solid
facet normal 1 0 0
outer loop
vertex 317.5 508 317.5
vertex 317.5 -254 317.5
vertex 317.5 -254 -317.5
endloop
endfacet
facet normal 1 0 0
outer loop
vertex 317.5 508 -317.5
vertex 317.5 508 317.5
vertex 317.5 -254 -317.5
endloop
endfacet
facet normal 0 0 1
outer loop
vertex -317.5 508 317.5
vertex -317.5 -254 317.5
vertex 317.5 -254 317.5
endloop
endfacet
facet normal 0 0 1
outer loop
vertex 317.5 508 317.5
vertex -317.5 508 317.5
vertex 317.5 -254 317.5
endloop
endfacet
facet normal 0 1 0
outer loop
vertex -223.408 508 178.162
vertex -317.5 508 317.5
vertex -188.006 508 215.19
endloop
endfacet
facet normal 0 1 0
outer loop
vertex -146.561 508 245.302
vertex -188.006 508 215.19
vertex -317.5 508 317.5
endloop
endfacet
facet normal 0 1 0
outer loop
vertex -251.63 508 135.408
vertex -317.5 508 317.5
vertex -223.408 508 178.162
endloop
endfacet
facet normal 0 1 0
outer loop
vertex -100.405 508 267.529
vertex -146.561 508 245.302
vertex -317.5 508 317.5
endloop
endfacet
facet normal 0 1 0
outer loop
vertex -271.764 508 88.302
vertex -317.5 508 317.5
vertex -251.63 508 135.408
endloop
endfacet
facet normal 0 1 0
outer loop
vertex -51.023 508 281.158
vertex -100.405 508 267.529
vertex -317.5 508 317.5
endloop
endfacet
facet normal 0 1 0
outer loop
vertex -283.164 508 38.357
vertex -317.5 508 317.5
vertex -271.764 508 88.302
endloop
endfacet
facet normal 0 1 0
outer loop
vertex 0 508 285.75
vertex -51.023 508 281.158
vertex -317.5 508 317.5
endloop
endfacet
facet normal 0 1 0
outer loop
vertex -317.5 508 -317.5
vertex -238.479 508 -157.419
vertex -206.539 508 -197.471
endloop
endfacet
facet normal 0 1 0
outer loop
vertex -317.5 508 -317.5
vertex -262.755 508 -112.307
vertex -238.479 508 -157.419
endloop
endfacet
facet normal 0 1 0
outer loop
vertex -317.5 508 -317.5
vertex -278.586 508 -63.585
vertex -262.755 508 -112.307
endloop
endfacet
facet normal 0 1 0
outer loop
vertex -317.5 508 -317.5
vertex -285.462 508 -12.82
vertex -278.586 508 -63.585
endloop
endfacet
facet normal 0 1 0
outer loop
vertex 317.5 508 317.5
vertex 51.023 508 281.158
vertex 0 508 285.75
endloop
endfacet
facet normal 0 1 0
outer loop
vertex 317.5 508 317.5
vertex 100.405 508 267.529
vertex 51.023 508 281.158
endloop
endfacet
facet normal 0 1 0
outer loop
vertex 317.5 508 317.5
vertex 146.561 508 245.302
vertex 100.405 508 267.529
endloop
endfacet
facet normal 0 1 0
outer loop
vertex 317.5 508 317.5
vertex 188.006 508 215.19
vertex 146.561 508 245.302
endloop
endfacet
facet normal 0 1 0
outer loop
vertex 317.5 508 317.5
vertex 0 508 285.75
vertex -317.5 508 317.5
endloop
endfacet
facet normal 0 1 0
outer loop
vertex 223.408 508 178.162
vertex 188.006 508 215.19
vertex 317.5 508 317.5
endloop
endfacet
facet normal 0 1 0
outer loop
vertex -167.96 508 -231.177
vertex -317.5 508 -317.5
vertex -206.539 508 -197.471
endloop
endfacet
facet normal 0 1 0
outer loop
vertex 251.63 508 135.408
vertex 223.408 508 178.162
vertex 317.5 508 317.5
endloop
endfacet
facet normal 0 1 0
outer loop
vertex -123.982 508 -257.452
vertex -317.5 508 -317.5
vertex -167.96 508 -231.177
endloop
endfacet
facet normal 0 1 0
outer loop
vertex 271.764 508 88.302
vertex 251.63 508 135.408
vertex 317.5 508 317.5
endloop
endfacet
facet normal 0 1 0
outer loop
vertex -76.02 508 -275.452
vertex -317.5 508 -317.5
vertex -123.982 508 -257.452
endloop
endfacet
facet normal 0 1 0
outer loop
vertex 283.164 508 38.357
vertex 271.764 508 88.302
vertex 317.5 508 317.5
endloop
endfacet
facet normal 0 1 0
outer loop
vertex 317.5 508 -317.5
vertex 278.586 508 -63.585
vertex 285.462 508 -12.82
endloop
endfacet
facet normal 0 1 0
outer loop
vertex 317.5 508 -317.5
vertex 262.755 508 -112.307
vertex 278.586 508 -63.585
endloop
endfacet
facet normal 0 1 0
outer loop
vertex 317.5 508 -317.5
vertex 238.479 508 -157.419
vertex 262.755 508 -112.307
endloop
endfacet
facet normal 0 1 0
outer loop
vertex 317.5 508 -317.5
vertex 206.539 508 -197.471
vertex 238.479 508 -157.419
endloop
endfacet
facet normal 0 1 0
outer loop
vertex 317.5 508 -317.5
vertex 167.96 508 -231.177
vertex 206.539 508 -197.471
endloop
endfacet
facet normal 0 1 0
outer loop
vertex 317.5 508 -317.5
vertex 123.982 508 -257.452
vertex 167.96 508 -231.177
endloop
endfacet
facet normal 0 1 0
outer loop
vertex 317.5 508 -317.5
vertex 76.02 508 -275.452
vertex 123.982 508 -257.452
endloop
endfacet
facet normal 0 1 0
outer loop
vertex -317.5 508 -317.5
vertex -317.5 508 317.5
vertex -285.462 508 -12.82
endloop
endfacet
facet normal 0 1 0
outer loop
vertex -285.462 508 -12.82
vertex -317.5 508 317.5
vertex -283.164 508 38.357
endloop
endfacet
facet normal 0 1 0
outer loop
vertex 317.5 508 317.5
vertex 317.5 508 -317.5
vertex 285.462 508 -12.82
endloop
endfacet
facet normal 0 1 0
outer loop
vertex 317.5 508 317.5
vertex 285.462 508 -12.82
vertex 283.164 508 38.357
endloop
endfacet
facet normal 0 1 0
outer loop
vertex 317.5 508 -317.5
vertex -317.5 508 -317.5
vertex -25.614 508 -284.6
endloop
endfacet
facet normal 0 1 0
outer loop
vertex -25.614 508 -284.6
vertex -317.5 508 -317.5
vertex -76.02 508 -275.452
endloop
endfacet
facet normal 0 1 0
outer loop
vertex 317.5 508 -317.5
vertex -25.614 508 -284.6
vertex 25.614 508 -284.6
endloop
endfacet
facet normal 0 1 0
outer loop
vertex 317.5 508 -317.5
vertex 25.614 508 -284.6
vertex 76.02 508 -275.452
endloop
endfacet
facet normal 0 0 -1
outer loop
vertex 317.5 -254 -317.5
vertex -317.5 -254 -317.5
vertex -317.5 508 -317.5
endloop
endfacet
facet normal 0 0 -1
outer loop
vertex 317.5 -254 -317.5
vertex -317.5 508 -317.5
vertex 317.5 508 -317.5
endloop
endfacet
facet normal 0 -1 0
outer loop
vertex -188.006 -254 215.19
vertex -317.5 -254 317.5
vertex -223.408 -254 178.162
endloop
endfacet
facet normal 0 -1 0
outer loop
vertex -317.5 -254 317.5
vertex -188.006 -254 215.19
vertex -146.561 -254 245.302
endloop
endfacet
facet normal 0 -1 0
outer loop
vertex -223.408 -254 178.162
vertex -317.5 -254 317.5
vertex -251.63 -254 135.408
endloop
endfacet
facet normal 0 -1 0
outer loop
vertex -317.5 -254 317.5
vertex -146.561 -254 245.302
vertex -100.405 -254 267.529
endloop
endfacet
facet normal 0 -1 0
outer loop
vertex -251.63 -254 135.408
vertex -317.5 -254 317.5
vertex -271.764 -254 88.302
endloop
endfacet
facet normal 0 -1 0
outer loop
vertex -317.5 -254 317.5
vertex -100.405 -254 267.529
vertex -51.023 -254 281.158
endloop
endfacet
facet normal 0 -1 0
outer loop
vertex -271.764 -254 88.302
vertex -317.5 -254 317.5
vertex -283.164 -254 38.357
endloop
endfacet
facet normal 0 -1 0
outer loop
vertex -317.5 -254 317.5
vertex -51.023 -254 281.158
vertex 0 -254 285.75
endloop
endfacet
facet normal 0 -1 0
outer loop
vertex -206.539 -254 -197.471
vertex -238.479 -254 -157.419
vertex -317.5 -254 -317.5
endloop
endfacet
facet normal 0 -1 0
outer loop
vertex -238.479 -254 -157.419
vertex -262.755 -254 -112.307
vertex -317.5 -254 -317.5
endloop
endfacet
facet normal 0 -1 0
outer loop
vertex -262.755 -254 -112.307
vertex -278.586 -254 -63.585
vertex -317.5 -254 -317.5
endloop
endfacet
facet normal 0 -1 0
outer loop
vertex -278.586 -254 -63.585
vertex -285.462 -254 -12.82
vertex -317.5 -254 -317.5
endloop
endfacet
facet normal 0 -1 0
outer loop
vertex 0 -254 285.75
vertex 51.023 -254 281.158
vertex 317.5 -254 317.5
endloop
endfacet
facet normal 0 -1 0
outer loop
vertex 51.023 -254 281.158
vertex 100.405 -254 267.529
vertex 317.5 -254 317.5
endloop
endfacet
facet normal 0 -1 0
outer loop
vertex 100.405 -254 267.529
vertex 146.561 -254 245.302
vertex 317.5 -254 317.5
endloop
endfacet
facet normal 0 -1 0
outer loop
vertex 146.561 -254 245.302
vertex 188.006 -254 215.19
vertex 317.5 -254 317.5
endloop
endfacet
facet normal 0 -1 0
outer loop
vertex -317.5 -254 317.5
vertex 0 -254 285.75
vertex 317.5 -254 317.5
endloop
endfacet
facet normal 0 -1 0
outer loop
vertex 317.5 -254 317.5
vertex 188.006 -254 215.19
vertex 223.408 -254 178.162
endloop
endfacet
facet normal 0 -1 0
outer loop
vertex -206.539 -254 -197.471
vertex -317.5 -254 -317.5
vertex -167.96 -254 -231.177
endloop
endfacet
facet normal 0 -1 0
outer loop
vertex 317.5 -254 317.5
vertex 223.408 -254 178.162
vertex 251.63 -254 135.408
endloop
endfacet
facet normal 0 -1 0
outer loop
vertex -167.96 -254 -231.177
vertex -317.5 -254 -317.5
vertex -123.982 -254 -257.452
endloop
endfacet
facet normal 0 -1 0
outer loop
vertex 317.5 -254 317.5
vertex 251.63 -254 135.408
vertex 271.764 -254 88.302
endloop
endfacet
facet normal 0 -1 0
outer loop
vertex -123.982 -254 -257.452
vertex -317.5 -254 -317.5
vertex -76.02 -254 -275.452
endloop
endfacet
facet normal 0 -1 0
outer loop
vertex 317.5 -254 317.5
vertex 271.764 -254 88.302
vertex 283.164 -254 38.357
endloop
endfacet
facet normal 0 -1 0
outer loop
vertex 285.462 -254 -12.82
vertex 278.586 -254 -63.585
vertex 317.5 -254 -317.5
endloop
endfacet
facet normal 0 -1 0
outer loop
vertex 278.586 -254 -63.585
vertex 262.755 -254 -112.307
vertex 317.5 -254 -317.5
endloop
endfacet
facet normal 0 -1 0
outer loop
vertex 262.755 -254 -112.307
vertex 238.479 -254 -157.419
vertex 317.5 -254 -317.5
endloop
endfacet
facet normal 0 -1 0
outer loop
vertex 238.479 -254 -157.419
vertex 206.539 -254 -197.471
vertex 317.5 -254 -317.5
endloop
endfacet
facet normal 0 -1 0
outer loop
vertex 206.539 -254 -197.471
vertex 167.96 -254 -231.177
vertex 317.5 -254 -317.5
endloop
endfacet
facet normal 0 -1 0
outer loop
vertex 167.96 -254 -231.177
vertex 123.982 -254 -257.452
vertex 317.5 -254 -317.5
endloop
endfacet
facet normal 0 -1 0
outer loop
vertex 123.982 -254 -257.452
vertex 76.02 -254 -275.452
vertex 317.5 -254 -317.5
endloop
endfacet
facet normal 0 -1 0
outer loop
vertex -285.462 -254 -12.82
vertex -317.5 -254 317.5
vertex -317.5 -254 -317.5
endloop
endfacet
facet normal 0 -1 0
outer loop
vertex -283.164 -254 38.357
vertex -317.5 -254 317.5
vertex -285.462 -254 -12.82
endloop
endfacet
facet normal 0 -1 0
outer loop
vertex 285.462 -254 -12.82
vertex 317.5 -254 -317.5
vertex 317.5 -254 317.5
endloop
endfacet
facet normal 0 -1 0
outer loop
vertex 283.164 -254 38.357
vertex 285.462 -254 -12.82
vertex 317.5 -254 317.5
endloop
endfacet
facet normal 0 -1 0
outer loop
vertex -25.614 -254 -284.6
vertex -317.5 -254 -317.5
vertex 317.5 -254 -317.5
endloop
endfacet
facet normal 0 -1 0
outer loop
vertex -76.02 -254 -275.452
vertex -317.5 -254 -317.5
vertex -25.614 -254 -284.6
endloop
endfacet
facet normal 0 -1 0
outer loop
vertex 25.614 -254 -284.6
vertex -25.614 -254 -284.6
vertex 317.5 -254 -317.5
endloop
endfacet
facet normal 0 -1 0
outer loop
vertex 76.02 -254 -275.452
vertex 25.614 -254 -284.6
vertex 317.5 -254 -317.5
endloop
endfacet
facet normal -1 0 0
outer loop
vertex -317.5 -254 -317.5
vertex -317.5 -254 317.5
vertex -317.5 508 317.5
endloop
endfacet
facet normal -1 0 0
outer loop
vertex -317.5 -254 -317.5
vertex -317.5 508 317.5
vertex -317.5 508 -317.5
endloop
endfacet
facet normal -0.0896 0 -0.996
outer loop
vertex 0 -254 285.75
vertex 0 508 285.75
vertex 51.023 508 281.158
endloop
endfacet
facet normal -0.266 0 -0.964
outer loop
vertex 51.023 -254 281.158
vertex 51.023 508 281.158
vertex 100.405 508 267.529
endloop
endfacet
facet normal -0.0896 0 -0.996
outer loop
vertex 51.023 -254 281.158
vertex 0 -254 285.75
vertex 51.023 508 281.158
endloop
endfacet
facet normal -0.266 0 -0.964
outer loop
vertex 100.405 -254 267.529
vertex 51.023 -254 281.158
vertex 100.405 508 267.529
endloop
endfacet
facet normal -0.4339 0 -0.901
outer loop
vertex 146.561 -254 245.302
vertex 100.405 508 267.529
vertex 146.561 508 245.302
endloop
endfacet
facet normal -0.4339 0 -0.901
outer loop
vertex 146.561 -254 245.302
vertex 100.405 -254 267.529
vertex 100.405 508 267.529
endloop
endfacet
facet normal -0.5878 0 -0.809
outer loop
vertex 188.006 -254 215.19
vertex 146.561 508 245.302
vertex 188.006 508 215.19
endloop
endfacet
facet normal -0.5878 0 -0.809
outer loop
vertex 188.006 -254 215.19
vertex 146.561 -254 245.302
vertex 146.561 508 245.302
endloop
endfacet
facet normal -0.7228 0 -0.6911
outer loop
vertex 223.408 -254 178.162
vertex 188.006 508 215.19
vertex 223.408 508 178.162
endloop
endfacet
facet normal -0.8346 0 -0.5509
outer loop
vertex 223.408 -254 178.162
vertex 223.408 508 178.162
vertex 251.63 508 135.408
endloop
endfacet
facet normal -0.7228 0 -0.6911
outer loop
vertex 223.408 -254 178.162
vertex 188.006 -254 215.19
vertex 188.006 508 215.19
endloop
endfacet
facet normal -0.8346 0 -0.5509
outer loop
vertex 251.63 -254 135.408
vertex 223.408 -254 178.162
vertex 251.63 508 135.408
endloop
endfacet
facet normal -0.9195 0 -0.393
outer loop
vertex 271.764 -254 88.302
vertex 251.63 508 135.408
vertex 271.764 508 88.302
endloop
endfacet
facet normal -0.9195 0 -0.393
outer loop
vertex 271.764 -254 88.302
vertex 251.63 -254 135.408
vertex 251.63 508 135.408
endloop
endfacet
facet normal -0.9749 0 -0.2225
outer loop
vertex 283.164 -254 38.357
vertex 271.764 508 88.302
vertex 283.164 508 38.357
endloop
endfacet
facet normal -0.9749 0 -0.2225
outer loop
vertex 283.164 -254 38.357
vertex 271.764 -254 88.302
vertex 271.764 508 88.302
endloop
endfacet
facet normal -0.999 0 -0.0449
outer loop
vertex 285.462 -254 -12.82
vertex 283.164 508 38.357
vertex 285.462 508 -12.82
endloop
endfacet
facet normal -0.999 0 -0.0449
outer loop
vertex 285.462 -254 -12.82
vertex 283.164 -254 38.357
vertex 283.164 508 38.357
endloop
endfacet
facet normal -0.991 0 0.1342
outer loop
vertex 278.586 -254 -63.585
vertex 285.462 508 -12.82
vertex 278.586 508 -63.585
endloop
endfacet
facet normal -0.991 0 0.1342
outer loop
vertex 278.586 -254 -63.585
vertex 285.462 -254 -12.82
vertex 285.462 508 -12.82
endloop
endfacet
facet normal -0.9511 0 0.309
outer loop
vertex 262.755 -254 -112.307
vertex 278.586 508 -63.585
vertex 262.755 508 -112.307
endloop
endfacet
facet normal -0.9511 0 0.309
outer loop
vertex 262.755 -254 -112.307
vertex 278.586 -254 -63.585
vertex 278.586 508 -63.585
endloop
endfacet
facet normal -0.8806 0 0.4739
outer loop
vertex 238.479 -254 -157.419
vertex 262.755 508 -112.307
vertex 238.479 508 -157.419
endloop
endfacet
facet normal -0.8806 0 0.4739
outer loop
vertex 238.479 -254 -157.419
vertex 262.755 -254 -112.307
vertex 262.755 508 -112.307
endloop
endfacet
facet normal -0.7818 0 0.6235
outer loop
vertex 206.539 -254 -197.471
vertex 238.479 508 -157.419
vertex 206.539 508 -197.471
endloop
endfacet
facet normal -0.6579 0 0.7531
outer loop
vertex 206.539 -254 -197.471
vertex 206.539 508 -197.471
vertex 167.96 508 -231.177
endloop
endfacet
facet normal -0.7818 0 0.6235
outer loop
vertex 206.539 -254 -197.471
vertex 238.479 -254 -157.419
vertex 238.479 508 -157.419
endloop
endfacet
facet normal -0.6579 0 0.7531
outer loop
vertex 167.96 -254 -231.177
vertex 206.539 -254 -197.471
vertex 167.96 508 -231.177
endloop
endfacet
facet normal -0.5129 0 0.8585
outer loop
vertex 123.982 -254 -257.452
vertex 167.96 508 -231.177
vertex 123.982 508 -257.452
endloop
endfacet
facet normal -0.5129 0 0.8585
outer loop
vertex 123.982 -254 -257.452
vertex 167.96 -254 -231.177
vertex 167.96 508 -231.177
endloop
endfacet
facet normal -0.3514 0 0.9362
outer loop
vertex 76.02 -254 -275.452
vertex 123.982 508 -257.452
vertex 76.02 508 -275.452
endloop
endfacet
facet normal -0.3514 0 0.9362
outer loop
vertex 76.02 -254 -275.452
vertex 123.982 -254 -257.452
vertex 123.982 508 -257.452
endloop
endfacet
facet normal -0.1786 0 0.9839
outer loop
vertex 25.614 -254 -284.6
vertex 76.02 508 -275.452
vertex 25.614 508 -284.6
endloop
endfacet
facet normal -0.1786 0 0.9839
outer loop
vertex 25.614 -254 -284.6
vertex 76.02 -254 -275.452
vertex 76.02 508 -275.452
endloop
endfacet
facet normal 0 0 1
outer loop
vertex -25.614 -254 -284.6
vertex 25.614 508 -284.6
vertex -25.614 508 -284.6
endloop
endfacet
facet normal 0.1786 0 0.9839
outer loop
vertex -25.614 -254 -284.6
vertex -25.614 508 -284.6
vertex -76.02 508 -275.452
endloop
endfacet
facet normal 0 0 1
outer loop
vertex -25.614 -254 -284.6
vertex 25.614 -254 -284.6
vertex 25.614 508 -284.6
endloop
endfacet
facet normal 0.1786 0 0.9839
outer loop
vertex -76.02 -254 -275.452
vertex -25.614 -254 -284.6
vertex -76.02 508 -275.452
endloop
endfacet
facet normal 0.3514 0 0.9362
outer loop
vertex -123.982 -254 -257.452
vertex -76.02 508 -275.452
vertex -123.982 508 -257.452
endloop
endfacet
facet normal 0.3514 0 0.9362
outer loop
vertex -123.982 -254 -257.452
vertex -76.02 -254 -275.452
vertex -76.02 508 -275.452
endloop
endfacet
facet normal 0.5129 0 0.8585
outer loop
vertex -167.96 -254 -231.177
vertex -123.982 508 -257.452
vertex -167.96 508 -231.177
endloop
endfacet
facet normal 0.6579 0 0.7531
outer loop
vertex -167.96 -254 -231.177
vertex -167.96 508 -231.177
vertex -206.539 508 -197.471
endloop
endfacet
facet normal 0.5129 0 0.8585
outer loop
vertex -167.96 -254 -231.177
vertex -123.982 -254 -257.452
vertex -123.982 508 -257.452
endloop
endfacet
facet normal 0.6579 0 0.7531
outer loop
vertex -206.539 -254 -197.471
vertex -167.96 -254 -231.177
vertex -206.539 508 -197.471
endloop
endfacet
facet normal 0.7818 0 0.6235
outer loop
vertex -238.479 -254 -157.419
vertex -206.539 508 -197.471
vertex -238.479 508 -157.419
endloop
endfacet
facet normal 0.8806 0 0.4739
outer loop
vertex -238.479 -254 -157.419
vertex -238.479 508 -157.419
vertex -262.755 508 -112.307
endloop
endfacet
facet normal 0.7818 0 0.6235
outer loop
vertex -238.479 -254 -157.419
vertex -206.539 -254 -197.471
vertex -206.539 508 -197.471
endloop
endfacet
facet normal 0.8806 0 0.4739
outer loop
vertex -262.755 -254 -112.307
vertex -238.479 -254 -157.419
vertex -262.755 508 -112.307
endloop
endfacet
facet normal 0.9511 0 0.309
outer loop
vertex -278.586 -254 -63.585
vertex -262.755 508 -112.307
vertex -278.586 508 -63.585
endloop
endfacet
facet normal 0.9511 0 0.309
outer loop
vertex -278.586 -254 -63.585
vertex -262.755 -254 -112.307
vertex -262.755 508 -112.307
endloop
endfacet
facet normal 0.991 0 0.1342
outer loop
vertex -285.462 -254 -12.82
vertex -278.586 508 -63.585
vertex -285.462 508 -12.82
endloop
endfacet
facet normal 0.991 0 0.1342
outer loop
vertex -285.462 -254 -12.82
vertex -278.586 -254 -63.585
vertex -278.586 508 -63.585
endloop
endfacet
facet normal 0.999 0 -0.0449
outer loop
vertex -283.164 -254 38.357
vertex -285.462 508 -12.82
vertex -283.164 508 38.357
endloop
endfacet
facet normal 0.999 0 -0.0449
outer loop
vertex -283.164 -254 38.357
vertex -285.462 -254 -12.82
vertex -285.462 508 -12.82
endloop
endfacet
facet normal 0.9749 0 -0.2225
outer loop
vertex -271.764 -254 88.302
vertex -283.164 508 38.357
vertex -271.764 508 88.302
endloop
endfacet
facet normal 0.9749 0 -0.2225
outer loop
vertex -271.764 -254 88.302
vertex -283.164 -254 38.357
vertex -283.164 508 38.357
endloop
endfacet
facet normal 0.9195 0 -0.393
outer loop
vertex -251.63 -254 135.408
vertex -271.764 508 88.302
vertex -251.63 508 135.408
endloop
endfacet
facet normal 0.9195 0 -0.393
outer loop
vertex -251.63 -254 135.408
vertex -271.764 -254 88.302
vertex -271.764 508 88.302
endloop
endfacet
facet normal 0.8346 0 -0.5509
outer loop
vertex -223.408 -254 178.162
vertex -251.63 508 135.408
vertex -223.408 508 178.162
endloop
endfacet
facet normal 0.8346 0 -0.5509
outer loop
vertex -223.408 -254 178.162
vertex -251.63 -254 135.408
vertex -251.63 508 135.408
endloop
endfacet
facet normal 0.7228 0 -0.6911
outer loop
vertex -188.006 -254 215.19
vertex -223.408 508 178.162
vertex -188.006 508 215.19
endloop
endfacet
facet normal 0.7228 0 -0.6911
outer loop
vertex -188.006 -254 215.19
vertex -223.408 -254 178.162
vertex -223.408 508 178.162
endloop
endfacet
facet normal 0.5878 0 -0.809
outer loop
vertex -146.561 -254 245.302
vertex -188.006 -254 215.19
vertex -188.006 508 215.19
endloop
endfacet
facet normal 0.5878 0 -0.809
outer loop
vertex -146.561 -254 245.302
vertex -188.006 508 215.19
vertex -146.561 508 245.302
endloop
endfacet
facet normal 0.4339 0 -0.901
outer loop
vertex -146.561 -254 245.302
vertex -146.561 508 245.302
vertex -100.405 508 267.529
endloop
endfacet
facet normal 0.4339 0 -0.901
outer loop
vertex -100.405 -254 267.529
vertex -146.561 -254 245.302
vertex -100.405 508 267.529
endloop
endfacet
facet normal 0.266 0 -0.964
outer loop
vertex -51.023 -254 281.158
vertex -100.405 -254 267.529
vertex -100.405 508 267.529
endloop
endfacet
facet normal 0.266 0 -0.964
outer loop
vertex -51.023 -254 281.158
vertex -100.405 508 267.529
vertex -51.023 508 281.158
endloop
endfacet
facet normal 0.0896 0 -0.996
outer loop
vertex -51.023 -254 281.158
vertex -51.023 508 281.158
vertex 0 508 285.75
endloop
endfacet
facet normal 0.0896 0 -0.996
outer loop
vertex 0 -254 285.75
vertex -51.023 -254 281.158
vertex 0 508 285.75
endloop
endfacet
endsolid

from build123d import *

# Parameters (mm, degrees)
BOSS_EXTRUDE1_DEPTH      = 508
BOSS_EXTRUDE1_DEPTH_BACK = 254
SKETCH1_W                = 635
SKETCH1_H                = 635
SKETCH1_R                = 285.75


with BuildPart() as part:
    # Sketch1 → Boss-Extrude1 (new, two sides: drawn at the far end of the back side and taken through both)
    with BuildSketch(Plane(origin=(0, 0, 0), x_dir=(1, 0, 0), z_dir=(0, 1, 0)).offset(-BOSS_EXTRUDE1_DEPTH_BACK)):
        Rectangle(SKETCH1_W, SKETCH1_H)
        Circle(SKETCH1_R, mode=Mode.SUBTRACT)
    extrude(amount=BOSS_EXTRUDE1_DEPTH + BOSS_EXTRUDE1_DEPTH_BACK)


solid = part.part
